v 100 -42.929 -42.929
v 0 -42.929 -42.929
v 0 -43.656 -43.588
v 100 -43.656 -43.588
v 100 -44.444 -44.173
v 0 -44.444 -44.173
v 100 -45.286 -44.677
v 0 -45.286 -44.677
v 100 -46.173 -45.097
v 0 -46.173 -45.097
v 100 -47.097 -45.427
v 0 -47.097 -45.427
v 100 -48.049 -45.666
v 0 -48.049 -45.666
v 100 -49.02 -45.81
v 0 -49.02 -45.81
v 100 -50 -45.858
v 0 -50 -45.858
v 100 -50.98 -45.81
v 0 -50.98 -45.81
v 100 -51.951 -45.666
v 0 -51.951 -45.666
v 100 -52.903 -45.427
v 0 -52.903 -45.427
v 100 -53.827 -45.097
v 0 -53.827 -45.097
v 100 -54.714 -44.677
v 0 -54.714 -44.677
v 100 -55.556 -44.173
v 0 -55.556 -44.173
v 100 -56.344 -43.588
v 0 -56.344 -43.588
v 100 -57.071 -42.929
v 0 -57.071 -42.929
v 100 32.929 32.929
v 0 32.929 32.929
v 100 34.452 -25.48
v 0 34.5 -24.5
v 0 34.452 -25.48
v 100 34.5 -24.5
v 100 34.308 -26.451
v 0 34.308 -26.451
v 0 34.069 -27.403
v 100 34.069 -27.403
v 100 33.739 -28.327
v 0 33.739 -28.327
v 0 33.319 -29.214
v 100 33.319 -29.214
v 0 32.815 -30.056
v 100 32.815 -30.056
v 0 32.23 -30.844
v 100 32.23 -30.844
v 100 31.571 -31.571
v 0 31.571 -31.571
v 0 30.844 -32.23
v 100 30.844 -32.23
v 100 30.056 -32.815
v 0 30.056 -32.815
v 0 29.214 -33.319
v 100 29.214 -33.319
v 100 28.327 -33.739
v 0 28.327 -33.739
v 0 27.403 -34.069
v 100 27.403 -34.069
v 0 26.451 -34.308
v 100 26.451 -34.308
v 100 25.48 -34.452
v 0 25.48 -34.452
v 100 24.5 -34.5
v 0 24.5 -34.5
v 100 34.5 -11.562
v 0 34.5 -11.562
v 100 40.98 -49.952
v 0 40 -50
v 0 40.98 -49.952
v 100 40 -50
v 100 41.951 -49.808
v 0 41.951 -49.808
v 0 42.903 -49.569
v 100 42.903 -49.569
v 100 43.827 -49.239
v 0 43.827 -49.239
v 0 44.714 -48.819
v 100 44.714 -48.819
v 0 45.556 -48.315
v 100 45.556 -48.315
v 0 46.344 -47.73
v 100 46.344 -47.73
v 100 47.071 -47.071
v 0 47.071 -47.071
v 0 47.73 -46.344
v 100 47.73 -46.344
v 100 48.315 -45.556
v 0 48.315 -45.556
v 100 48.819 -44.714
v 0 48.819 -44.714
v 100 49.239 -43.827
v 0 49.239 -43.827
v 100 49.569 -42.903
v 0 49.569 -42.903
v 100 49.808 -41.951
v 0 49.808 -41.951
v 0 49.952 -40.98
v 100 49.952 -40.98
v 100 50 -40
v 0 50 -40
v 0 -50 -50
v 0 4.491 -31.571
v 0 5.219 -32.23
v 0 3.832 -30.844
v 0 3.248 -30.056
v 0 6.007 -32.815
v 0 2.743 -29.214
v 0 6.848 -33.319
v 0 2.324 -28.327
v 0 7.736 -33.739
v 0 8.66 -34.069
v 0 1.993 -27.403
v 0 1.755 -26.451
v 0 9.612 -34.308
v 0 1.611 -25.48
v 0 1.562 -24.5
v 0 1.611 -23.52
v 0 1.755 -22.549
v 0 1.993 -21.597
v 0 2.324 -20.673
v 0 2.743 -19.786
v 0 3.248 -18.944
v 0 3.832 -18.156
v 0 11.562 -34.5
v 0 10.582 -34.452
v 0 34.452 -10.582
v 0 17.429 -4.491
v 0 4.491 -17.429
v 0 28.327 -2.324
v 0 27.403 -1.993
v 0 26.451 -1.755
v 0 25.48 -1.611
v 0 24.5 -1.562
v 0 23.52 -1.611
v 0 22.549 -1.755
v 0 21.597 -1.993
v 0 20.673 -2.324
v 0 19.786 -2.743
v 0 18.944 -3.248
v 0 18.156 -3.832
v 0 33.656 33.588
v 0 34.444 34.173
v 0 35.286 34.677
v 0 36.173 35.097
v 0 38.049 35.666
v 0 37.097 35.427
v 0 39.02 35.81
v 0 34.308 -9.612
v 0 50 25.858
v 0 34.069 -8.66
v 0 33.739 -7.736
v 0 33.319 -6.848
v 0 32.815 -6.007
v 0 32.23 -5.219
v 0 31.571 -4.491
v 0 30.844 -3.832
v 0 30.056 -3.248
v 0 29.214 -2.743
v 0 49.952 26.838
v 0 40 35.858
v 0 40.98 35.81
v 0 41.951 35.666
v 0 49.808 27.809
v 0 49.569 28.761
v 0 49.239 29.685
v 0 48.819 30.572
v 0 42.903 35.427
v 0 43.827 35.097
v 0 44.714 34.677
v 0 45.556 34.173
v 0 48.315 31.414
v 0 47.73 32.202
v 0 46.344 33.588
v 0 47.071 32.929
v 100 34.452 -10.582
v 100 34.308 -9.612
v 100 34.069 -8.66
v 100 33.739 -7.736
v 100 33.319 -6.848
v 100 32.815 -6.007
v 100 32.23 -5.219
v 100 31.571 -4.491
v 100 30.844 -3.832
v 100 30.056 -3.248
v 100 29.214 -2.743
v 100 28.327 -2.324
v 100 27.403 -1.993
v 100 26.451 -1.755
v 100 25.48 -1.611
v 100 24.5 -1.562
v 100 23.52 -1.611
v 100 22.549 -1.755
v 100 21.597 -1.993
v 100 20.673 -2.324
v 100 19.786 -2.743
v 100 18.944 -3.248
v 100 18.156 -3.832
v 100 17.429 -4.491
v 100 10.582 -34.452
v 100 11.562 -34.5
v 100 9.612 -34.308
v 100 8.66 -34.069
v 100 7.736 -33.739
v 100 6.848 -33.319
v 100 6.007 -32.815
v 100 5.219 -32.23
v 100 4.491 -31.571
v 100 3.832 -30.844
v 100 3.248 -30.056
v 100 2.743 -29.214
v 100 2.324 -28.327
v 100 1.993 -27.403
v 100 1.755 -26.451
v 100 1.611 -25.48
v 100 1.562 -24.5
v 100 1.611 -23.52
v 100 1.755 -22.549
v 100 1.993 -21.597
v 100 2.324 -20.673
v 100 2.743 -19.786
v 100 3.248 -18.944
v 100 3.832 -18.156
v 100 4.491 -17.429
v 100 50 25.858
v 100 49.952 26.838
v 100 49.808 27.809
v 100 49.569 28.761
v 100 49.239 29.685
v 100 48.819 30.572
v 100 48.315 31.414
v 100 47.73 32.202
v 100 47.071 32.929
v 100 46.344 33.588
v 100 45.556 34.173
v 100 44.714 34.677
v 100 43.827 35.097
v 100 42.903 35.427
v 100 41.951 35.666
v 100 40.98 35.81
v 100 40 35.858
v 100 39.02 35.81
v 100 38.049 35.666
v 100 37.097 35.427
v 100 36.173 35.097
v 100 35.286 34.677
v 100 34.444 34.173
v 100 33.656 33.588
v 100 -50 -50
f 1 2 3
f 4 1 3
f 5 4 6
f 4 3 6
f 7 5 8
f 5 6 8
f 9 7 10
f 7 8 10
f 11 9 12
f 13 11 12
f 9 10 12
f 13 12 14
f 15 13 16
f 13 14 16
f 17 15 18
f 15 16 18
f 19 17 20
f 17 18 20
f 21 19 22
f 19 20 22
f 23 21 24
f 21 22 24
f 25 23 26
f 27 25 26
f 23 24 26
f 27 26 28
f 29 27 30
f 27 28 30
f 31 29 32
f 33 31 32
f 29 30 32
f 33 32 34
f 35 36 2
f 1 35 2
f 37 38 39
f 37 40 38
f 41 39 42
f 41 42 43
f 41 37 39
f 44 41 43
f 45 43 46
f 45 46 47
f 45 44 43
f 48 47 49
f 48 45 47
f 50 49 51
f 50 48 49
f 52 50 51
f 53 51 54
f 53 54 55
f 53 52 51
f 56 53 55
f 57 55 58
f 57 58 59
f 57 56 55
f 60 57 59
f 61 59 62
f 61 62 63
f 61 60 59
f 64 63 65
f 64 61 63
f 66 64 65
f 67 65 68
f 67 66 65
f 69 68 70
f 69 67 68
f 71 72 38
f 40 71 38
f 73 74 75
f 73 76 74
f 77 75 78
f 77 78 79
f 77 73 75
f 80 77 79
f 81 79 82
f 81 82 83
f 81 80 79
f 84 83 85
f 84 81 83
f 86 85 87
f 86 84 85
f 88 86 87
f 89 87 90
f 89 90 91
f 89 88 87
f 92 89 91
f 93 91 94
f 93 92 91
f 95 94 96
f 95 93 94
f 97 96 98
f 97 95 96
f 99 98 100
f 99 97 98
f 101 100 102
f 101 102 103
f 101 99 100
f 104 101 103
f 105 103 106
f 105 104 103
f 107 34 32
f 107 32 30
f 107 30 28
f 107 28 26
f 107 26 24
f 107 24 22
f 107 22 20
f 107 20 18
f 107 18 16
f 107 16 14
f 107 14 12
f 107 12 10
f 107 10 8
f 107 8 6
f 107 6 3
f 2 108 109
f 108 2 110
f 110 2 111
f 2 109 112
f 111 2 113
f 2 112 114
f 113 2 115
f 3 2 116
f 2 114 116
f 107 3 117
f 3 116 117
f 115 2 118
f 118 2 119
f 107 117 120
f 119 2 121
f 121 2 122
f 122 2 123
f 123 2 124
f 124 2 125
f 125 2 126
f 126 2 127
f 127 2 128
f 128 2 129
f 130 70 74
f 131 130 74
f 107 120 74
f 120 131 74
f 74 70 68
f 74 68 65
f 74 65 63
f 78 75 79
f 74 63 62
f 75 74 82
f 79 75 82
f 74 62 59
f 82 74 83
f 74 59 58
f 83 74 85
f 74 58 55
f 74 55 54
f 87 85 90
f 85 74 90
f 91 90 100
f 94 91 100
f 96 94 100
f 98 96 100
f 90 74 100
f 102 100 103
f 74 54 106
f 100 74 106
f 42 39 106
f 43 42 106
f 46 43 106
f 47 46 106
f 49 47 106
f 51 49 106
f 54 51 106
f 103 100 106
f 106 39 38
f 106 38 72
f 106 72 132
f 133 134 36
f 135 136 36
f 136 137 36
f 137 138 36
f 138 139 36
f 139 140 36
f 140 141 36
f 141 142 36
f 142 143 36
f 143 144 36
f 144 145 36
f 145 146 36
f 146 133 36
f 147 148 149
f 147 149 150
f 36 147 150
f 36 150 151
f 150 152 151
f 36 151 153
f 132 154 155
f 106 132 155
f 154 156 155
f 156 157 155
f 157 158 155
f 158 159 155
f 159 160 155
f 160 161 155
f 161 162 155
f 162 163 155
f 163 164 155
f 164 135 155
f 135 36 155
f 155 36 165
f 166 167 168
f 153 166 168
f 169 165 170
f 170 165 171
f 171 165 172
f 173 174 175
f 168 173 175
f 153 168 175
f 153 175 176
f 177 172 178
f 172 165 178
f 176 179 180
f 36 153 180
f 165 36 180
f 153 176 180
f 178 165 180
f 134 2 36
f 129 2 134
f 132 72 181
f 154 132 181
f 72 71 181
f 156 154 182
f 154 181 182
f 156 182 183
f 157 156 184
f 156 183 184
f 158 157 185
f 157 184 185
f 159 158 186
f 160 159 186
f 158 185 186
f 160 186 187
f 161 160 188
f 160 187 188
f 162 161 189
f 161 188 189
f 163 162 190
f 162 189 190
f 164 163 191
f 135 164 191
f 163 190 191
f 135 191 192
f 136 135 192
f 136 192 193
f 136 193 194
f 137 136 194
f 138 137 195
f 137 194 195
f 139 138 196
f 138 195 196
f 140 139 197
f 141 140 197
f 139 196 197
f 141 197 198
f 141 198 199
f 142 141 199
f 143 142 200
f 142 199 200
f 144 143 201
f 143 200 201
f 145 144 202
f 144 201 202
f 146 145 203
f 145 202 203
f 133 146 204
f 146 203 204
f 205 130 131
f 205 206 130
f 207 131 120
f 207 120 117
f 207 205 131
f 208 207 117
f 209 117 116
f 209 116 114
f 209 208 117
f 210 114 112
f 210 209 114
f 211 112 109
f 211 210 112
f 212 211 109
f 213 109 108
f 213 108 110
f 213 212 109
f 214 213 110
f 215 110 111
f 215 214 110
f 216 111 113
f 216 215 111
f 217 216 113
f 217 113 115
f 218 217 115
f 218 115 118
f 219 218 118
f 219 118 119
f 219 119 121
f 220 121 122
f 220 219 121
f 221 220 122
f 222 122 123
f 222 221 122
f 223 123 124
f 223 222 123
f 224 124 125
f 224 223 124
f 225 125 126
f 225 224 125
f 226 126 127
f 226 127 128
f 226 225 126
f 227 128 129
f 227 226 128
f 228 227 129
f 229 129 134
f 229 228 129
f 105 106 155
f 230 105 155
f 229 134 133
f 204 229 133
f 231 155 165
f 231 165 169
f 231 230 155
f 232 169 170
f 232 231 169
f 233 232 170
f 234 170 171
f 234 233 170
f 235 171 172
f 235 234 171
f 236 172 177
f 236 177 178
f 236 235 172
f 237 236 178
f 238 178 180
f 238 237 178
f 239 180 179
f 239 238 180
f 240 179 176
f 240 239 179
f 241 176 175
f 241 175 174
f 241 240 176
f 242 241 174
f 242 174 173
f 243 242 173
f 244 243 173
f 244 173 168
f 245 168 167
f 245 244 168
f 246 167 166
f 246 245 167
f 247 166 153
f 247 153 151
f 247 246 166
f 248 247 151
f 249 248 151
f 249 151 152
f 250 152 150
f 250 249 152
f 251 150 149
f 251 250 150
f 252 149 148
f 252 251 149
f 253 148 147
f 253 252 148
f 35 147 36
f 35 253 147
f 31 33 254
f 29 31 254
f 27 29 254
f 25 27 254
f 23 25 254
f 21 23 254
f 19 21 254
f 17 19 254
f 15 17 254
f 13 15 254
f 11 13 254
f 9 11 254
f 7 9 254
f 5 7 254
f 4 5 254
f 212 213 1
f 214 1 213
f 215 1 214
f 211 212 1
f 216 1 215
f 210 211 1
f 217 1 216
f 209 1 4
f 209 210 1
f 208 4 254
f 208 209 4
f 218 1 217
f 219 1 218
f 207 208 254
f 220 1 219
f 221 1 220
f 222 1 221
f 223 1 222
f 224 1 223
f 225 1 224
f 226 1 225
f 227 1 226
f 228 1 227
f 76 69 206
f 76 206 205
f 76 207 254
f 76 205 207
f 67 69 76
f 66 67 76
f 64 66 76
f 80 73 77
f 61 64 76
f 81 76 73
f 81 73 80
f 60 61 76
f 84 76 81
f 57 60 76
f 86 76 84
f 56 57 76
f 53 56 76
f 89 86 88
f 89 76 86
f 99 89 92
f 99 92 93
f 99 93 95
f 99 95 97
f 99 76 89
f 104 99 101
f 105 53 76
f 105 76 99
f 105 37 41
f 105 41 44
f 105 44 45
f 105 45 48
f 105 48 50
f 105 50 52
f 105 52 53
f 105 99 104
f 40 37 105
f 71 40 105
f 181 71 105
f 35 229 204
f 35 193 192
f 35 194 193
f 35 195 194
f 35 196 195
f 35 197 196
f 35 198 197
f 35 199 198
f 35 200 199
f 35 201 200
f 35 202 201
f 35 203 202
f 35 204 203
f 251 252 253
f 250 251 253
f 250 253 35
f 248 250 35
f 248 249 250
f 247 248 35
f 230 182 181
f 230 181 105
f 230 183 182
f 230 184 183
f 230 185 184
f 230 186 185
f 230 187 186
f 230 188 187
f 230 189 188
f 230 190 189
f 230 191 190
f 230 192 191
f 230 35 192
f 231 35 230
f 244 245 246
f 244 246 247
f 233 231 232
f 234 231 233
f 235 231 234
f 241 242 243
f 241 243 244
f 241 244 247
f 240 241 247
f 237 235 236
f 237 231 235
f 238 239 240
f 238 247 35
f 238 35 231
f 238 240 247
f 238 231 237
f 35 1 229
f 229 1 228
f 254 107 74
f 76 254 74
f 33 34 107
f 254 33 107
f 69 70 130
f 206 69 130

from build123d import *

# Parameters (mm, degrees)
F1_DEPTH = 100
F2_R     = 10


with BuildPart() as f1:
    # F0 (on Right) → F1 (new body)
    with BuildSketch(Plane.YZ):
        Polygon((-50, -50), (50, -50), (50, 50), (-42.928932, -42.928932), align=None)
        Polygon((34.5, -34.5), (-12.57969, -34.5), (34.5, 12.57969), align=None, mode=Mode.SUBTRACT)
        with BuildLine():
            Line((-57.071068, -42.928932), (-50, -50))
            Line((-50, -50), (-42.928932, -42.928932))
            ThreePointArc((-42.928932, -42.928932), (-50, -45.857864), (-57.071068, -42.928932))
        make_face()
    extrude(amount=F1_DEPTH)

    # F2
    f2_edges = [f1.edges().sort_by_distance(p)[0] for p in [
        (50, 50, 50),
        (50, 34.5, 12.57969),
        (50, 50, -50),
        (50, 34.5, -34.5),
        (50, -12.57969, -34.5),
    ]]
    fillet(f2_edges, radius=F2_R)


solid = f1.part
